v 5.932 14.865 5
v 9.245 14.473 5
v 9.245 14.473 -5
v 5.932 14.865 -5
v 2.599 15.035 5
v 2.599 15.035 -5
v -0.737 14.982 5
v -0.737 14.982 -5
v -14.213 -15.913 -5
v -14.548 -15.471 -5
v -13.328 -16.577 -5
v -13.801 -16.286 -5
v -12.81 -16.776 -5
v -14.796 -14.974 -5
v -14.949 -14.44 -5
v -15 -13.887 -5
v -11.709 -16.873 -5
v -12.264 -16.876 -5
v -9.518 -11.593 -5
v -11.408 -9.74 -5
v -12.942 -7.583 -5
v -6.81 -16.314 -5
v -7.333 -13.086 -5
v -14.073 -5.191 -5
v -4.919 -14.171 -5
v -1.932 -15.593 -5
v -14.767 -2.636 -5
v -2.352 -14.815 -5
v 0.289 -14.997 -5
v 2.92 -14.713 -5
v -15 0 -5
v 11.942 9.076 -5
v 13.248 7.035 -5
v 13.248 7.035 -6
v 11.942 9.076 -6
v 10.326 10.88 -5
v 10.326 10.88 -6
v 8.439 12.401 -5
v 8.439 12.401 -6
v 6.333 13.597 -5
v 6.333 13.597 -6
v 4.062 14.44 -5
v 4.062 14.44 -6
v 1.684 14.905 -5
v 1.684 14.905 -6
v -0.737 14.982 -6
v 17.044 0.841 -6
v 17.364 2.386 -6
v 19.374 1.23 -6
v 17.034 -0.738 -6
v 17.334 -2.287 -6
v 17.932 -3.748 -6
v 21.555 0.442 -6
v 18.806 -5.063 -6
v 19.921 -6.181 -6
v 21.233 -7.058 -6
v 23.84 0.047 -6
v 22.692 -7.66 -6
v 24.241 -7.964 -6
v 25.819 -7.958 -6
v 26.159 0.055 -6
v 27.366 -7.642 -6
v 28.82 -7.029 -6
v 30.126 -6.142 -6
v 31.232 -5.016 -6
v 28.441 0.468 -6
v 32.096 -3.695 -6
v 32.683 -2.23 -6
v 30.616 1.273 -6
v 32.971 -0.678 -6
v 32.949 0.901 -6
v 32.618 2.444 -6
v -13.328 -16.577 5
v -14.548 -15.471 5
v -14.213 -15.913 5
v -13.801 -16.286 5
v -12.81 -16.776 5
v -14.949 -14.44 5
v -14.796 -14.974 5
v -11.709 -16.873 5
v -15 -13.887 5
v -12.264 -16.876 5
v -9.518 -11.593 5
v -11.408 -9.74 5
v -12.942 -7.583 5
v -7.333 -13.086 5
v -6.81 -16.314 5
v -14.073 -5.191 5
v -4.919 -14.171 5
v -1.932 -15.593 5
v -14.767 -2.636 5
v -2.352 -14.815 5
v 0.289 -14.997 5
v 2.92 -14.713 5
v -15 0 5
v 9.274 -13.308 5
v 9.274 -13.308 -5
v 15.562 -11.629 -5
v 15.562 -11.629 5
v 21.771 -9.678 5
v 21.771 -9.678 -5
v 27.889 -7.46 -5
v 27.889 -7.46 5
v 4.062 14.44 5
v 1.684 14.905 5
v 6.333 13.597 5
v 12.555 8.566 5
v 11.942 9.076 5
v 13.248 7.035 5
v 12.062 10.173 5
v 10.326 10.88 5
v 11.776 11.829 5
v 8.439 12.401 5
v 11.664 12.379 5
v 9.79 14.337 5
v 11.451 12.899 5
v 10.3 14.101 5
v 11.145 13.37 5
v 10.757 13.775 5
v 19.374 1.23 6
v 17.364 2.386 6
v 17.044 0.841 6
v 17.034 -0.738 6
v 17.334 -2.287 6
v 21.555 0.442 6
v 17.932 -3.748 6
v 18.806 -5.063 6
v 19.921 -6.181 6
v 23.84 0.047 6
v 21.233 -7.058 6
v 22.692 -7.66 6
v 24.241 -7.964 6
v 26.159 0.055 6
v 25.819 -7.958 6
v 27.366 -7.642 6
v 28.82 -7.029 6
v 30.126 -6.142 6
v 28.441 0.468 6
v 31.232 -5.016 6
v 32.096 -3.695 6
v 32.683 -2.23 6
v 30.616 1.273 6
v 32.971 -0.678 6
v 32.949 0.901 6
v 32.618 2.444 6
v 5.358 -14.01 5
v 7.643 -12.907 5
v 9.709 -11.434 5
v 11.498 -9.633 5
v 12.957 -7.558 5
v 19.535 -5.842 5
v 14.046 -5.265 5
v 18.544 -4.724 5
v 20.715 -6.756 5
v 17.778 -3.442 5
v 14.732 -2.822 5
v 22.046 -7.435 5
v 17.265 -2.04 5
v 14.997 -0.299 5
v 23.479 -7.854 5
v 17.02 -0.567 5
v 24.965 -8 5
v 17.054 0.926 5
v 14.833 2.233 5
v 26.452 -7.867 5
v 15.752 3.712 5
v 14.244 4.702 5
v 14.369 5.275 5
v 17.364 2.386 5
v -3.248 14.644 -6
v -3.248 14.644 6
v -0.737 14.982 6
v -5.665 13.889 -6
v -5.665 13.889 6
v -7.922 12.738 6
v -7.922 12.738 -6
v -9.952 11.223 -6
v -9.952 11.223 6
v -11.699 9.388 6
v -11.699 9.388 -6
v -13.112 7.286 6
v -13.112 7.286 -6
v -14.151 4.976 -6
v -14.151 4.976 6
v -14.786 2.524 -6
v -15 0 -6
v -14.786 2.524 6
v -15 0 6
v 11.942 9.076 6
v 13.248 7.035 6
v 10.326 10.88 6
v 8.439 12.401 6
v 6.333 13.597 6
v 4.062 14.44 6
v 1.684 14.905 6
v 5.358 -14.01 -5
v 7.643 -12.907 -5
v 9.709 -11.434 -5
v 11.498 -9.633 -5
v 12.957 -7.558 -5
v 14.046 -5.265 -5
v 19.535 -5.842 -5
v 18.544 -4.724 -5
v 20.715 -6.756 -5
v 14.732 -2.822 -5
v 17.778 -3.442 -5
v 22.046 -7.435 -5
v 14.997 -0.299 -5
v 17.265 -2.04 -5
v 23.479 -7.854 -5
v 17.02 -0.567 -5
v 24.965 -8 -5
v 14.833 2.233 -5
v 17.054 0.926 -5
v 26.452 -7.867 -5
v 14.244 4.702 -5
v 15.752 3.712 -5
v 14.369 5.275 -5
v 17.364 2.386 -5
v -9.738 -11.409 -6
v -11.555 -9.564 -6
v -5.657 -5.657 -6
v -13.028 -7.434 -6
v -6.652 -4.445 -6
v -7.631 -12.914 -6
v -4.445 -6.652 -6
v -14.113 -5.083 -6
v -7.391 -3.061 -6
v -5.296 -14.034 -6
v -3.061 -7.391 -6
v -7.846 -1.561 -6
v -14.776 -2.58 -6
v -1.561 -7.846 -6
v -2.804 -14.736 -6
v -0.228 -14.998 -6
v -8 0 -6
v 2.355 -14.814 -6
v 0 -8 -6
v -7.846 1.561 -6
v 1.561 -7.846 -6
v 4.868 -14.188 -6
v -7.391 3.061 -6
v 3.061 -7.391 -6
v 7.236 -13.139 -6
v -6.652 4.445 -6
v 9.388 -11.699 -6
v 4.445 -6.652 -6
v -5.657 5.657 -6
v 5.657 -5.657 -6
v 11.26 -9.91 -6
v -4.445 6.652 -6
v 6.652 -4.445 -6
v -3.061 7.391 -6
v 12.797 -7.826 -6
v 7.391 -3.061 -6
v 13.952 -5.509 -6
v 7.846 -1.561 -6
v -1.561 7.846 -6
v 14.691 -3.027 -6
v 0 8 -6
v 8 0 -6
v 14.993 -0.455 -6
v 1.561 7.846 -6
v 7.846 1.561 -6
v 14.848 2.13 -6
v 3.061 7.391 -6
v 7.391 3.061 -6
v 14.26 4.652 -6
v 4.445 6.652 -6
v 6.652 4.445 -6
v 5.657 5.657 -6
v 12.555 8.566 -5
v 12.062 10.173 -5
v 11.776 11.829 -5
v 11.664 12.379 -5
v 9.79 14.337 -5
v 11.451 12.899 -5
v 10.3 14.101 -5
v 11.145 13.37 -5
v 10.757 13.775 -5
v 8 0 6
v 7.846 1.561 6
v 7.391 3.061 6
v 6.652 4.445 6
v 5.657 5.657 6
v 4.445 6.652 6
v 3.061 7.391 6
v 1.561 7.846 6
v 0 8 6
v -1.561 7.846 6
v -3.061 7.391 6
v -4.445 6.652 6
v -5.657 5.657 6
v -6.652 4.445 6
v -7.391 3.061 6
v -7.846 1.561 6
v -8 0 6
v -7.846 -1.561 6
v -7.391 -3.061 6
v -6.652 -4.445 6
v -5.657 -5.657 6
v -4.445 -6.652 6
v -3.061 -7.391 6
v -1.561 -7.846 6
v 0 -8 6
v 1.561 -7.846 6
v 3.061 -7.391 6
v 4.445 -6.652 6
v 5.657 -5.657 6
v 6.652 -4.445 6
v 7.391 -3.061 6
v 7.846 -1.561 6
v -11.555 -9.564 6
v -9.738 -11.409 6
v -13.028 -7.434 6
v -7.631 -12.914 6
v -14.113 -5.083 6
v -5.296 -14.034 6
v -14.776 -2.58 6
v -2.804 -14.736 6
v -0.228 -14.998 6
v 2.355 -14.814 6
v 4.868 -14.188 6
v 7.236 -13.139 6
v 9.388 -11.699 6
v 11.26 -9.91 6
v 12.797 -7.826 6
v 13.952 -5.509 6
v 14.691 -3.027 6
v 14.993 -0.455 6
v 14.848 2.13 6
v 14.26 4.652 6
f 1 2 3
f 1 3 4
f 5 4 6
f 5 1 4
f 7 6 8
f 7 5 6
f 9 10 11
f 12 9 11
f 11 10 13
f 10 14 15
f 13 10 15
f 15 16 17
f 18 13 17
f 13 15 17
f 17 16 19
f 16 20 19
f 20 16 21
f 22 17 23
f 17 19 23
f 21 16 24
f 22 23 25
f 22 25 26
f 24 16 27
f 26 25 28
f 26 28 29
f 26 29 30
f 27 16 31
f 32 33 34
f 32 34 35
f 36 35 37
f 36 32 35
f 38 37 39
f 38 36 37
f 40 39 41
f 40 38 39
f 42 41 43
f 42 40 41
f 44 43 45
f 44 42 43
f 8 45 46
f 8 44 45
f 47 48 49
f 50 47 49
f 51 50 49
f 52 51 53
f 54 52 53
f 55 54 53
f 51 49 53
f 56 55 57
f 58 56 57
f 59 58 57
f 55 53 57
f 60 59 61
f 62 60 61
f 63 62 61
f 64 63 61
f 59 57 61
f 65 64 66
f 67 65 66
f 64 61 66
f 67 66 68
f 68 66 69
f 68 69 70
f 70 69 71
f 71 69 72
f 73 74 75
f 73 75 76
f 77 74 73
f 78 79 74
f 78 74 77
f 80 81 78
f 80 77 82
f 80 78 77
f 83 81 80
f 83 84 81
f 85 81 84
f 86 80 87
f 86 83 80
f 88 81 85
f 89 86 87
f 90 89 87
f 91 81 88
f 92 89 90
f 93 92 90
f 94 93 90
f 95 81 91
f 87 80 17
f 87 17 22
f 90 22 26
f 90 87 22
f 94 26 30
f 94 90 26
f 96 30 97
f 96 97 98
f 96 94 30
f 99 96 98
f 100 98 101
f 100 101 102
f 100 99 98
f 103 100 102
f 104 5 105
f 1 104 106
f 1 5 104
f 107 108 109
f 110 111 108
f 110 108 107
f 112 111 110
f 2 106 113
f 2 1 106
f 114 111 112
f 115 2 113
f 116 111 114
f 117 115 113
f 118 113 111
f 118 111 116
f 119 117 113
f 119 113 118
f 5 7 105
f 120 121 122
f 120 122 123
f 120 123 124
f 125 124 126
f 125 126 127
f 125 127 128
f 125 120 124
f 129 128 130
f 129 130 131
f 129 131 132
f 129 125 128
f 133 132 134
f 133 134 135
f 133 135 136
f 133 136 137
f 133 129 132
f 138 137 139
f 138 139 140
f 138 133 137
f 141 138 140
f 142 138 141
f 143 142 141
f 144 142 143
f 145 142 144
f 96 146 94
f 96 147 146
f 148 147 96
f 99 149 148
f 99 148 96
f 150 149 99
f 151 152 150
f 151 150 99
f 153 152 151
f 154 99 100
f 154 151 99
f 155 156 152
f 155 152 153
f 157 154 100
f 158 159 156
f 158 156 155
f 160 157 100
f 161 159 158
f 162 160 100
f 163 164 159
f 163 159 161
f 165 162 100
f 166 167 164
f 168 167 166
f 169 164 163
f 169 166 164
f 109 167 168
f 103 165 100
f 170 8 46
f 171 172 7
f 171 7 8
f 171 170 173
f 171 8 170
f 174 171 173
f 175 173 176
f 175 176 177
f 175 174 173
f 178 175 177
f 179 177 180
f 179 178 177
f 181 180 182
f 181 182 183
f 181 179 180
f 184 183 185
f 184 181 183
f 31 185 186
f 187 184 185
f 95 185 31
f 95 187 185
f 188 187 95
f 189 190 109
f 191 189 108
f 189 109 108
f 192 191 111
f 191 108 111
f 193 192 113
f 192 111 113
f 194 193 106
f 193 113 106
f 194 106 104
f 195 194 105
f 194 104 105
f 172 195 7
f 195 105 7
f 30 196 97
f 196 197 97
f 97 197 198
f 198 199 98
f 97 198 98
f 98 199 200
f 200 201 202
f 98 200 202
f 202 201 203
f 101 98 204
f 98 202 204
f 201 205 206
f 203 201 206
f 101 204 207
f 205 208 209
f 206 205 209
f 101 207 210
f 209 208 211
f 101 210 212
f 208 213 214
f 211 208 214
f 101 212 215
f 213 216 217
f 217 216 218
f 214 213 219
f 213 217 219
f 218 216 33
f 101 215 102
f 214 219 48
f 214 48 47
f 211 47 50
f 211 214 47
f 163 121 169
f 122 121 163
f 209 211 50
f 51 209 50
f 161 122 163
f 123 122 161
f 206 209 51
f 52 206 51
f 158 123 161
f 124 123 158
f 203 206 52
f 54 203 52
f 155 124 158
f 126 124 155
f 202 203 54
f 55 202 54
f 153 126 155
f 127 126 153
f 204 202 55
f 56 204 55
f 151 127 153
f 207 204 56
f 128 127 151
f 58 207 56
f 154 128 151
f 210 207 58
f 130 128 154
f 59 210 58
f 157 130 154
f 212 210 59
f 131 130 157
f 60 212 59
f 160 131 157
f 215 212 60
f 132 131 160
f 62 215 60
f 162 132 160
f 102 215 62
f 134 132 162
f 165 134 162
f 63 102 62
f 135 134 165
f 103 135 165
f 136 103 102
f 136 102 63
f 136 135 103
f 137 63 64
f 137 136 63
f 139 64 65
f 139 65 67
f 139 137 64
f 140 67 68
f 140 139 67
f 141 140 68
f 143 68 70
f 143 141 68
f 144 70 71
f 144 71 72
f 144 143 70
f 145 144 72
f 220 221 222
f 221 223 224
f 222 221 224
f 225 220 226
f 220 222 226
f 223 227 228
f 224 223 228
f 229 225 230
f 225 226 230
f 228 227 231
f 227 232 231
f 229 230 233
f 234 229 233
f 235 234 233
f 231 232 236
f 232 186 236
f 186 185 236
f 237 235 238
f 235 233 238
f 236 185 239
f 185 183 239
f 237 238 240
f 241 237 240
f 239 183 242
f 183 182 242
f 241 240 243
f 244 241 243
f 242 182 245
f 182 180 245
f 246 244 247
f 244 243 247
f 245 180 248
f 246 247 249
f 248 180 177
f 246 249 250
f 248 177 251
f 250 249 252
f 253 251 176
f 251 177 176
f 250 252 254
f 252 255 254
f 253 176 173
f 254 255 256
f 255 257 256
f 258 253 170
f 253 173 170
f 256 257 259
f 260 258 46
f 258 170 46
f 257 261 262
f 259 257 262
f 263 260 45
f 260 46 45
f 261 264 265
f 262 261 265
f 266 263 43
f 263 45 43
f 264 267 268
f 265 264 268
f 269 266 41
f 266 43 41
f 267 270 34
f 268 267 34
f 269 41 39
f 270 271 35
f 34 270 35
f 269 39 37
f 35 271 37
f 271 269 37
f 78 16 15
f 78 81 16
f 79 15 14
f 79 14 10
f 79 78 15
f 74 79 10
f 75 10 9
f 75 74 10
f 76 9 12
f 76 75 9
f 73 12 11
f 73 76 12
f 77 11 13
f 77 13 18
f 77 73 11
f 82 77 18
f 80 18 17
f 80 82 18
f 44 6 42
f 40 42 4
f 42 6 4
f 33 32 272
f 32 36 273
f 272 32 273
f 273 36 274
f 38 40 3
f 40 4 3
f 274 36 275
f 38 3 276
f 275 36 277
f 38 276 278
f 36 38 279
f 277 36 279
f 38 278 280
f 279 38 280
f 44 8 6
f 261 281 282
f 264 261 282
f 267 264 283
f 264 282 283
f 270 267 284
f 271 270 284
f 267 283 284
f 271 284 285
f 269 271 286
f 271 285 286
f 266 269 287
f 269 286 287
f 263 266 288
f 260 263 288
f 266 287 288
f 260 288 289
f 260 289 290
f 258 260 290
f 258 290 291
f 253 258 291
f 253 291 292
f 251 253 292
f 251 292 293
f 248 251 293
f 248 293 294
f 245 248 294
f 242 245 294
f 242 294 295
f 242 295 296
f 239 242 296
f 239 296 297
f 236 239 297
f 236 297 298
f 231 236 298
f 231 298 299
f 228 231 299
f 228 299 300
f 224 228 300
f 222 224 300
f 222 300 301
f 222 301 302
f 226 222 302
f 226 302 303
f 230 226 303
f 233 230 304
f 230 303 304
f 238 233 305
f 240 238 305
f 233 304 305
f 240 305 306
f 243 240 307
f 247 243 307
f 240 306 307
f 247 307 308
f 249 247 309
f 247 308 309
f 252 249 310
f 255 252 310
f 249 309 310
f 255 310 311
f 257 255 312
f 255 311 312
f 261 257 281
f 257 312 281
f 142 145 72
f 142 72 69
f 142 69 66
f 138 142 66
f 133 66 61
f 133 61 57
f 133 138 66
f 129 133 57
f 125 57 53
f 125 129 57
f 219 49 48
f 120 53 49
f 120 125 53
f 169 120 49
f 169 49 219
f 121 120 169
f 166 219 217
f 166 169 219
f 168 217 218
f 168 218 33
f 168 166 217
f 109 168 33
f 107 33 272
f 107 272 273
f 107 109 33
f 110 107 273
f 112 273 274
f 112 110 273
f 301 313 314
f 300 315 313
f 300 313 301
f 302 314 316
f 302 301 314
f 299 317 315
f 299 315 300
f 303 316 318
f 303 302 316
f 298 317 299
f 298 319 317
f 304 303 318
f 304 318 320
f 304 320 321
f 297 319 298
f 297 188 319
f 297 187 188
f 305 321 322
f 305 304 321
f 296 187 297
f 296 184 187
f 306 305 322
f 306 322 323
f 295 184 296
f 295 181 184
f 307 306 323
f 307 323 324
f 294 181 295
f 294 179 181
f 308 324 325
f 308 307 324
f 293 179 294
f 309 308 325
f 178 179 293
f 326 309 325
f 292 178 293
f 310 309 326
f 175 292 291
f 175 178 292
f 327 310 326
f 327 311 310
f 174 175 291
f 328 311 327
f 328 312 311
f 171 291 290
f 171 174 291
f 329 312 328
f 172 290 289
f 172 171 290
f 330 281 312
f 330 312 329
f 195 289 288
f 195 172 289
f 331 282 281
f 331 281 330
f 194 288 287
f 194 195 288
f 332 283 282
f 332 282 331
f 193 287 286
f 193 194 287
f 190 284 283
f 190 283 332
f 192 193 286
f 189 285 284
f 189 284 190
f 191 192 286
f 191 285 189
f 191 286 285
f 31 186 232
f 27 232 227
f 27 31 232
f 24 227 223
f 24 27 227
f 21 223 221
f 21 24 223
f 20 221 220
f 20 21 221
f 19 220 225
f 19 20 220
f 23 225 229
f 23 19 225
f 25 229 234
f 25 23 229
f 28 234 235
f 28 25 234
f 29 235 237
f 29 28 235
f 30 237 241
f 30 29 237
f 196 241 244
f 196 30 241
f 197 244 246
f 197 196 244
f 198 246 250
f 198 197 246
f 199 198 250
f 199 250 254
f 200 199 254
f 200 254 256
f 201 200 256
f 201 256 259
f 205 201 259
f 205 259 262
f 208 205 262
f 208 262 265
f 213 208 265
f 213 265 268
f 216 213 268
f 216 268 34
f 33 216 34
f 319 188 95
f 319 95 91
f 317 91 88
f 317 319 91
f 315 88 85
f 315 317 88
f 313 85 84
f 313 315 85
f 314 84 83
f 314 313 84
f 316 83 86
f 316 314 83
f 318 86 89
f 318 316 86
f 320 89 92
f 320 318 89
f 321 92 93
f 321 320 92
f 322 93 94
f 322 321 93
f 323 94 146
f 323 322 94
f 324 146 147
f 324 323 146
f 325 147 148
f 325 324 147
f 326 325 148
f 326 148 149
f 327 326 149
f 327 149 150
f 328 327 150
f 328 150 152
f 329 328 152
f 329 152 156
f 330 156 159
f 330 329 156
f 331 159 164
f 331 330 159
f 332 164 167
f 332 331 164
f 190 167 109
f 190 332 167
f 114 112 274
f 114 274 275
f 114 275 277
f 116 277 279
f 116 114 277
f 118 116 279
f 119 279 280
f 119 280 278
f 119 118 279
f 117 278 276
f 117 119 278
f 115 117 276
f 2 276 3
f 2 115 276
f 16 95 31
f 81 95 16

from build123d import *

# Parameters (mm, degrees)
EXTRUDE_1_DEPTH     = 5
EXTRUDE_2_DEPTH     = 6
EXTRUDE_3_DEPTH     = 6
SKETCH_4_R          = 8
CUT_EXTRUDE_1_DEPTH = 39.963875359


with BuildPart() as part:
    # 草图1 → 凸台-拉伸1 (new, symmetric)
    with BuildSketch(Plane.XY):
        with BuildLine():
            ThreePointArc((17.364205719, 2.386345678), (19.534538398, -5.841979928), (27.889014085, -7.460133888))
            ThreePointArc((27.889014085, -7.460133888), (32.219400839, -3.446774076), (32.617548437, 2.443963137))
            ThreePointArc((32.617548437, 2.443963137), (24.999999643, 9.4528e-05), (17.364205719, 2.386345678))
        make_face()
        with BuildLine():
            ThreePointArc((-0.737142857, 14.981876398), (-10.864095518, 10.342699288), (-15, 0))
            Line((-15, 0), (-15, -13.8873794))
            ThreePointArc((-15, -13.8873794), (-14.015653031, -16.10934764), (-11.708571429, -16.873190745))
            ThreePointArc((-11.708571429, -16.873190745), (8.410971794, -13.51595237), (27.889014085, -7.460133888))
            ThreePointArc((27.889014085, -7.460133888), (19.534538398, -5.841979928), (17.364205719, 2.386345678))
            ThreePointArc((17.364205719, 2.386345678), (13.547023493, 6.501980338), (11.776397664, 11.828725402))
            ThreePointArc((11.776397664, 11.828725402), (10.960769899, 13.5814964), (9.245219778, 14.472755399))
            ThreePointArc((9.245219778, 14.472755399), (4.266792486, 14.97738476), (-0.737142857, 14.981876398))
        make_face()
    extrude(amount=EXTRUDE_1_DEPTH, both=True)

    # 草图2 → 凸台-拉伸2 (add, symmetric)
    with BuildSketch(Plane.XY):
        with BuildLine():
            ThreePointArc((-15, 0), (3.625161022, -14.555349792), (13.247761009, 7.03539823))
            ThreePointArc((13.247761009, 7.03539823), (7.410500688, 13.041644051), (-0.737142857, 14.981876398))
            ThreePointArc((-0.737142857, 14.981876398), (-10.864095518, 10.342699288), (-15, 0))
        make_face()
    extrude(amount=EXTRUDE_2_DEPTH, both=True)

    # 草图3 → 凸台-拉伸3 (add, symmetric)
    with BuildSketch(Plane.XY):
        with BuildLine():
            ThreePointArc((17.364205719, 2.386345678), (25.030218713, -7.999942927), (32.617548437, 2.443963137))
            ThreePointArc((32.617548437, 2.443963137), (24.999999643, 9.4528e-05), (17.364205719, 2.386345678))
        make_face()
    extrude(amount=EXTRUDE_3_DEPTH, both=True)

    # 草图4 → 切除-拉伸1 (cut, through all)
    with BuildSketch(Plane.XY.offset(6)):
        Circle(SKETCH_4_R)
    extrude(amount=-CUT_EXTRUDE_1_DEPTH, mode=Mode.SUBTRACT)


solid = part.part
